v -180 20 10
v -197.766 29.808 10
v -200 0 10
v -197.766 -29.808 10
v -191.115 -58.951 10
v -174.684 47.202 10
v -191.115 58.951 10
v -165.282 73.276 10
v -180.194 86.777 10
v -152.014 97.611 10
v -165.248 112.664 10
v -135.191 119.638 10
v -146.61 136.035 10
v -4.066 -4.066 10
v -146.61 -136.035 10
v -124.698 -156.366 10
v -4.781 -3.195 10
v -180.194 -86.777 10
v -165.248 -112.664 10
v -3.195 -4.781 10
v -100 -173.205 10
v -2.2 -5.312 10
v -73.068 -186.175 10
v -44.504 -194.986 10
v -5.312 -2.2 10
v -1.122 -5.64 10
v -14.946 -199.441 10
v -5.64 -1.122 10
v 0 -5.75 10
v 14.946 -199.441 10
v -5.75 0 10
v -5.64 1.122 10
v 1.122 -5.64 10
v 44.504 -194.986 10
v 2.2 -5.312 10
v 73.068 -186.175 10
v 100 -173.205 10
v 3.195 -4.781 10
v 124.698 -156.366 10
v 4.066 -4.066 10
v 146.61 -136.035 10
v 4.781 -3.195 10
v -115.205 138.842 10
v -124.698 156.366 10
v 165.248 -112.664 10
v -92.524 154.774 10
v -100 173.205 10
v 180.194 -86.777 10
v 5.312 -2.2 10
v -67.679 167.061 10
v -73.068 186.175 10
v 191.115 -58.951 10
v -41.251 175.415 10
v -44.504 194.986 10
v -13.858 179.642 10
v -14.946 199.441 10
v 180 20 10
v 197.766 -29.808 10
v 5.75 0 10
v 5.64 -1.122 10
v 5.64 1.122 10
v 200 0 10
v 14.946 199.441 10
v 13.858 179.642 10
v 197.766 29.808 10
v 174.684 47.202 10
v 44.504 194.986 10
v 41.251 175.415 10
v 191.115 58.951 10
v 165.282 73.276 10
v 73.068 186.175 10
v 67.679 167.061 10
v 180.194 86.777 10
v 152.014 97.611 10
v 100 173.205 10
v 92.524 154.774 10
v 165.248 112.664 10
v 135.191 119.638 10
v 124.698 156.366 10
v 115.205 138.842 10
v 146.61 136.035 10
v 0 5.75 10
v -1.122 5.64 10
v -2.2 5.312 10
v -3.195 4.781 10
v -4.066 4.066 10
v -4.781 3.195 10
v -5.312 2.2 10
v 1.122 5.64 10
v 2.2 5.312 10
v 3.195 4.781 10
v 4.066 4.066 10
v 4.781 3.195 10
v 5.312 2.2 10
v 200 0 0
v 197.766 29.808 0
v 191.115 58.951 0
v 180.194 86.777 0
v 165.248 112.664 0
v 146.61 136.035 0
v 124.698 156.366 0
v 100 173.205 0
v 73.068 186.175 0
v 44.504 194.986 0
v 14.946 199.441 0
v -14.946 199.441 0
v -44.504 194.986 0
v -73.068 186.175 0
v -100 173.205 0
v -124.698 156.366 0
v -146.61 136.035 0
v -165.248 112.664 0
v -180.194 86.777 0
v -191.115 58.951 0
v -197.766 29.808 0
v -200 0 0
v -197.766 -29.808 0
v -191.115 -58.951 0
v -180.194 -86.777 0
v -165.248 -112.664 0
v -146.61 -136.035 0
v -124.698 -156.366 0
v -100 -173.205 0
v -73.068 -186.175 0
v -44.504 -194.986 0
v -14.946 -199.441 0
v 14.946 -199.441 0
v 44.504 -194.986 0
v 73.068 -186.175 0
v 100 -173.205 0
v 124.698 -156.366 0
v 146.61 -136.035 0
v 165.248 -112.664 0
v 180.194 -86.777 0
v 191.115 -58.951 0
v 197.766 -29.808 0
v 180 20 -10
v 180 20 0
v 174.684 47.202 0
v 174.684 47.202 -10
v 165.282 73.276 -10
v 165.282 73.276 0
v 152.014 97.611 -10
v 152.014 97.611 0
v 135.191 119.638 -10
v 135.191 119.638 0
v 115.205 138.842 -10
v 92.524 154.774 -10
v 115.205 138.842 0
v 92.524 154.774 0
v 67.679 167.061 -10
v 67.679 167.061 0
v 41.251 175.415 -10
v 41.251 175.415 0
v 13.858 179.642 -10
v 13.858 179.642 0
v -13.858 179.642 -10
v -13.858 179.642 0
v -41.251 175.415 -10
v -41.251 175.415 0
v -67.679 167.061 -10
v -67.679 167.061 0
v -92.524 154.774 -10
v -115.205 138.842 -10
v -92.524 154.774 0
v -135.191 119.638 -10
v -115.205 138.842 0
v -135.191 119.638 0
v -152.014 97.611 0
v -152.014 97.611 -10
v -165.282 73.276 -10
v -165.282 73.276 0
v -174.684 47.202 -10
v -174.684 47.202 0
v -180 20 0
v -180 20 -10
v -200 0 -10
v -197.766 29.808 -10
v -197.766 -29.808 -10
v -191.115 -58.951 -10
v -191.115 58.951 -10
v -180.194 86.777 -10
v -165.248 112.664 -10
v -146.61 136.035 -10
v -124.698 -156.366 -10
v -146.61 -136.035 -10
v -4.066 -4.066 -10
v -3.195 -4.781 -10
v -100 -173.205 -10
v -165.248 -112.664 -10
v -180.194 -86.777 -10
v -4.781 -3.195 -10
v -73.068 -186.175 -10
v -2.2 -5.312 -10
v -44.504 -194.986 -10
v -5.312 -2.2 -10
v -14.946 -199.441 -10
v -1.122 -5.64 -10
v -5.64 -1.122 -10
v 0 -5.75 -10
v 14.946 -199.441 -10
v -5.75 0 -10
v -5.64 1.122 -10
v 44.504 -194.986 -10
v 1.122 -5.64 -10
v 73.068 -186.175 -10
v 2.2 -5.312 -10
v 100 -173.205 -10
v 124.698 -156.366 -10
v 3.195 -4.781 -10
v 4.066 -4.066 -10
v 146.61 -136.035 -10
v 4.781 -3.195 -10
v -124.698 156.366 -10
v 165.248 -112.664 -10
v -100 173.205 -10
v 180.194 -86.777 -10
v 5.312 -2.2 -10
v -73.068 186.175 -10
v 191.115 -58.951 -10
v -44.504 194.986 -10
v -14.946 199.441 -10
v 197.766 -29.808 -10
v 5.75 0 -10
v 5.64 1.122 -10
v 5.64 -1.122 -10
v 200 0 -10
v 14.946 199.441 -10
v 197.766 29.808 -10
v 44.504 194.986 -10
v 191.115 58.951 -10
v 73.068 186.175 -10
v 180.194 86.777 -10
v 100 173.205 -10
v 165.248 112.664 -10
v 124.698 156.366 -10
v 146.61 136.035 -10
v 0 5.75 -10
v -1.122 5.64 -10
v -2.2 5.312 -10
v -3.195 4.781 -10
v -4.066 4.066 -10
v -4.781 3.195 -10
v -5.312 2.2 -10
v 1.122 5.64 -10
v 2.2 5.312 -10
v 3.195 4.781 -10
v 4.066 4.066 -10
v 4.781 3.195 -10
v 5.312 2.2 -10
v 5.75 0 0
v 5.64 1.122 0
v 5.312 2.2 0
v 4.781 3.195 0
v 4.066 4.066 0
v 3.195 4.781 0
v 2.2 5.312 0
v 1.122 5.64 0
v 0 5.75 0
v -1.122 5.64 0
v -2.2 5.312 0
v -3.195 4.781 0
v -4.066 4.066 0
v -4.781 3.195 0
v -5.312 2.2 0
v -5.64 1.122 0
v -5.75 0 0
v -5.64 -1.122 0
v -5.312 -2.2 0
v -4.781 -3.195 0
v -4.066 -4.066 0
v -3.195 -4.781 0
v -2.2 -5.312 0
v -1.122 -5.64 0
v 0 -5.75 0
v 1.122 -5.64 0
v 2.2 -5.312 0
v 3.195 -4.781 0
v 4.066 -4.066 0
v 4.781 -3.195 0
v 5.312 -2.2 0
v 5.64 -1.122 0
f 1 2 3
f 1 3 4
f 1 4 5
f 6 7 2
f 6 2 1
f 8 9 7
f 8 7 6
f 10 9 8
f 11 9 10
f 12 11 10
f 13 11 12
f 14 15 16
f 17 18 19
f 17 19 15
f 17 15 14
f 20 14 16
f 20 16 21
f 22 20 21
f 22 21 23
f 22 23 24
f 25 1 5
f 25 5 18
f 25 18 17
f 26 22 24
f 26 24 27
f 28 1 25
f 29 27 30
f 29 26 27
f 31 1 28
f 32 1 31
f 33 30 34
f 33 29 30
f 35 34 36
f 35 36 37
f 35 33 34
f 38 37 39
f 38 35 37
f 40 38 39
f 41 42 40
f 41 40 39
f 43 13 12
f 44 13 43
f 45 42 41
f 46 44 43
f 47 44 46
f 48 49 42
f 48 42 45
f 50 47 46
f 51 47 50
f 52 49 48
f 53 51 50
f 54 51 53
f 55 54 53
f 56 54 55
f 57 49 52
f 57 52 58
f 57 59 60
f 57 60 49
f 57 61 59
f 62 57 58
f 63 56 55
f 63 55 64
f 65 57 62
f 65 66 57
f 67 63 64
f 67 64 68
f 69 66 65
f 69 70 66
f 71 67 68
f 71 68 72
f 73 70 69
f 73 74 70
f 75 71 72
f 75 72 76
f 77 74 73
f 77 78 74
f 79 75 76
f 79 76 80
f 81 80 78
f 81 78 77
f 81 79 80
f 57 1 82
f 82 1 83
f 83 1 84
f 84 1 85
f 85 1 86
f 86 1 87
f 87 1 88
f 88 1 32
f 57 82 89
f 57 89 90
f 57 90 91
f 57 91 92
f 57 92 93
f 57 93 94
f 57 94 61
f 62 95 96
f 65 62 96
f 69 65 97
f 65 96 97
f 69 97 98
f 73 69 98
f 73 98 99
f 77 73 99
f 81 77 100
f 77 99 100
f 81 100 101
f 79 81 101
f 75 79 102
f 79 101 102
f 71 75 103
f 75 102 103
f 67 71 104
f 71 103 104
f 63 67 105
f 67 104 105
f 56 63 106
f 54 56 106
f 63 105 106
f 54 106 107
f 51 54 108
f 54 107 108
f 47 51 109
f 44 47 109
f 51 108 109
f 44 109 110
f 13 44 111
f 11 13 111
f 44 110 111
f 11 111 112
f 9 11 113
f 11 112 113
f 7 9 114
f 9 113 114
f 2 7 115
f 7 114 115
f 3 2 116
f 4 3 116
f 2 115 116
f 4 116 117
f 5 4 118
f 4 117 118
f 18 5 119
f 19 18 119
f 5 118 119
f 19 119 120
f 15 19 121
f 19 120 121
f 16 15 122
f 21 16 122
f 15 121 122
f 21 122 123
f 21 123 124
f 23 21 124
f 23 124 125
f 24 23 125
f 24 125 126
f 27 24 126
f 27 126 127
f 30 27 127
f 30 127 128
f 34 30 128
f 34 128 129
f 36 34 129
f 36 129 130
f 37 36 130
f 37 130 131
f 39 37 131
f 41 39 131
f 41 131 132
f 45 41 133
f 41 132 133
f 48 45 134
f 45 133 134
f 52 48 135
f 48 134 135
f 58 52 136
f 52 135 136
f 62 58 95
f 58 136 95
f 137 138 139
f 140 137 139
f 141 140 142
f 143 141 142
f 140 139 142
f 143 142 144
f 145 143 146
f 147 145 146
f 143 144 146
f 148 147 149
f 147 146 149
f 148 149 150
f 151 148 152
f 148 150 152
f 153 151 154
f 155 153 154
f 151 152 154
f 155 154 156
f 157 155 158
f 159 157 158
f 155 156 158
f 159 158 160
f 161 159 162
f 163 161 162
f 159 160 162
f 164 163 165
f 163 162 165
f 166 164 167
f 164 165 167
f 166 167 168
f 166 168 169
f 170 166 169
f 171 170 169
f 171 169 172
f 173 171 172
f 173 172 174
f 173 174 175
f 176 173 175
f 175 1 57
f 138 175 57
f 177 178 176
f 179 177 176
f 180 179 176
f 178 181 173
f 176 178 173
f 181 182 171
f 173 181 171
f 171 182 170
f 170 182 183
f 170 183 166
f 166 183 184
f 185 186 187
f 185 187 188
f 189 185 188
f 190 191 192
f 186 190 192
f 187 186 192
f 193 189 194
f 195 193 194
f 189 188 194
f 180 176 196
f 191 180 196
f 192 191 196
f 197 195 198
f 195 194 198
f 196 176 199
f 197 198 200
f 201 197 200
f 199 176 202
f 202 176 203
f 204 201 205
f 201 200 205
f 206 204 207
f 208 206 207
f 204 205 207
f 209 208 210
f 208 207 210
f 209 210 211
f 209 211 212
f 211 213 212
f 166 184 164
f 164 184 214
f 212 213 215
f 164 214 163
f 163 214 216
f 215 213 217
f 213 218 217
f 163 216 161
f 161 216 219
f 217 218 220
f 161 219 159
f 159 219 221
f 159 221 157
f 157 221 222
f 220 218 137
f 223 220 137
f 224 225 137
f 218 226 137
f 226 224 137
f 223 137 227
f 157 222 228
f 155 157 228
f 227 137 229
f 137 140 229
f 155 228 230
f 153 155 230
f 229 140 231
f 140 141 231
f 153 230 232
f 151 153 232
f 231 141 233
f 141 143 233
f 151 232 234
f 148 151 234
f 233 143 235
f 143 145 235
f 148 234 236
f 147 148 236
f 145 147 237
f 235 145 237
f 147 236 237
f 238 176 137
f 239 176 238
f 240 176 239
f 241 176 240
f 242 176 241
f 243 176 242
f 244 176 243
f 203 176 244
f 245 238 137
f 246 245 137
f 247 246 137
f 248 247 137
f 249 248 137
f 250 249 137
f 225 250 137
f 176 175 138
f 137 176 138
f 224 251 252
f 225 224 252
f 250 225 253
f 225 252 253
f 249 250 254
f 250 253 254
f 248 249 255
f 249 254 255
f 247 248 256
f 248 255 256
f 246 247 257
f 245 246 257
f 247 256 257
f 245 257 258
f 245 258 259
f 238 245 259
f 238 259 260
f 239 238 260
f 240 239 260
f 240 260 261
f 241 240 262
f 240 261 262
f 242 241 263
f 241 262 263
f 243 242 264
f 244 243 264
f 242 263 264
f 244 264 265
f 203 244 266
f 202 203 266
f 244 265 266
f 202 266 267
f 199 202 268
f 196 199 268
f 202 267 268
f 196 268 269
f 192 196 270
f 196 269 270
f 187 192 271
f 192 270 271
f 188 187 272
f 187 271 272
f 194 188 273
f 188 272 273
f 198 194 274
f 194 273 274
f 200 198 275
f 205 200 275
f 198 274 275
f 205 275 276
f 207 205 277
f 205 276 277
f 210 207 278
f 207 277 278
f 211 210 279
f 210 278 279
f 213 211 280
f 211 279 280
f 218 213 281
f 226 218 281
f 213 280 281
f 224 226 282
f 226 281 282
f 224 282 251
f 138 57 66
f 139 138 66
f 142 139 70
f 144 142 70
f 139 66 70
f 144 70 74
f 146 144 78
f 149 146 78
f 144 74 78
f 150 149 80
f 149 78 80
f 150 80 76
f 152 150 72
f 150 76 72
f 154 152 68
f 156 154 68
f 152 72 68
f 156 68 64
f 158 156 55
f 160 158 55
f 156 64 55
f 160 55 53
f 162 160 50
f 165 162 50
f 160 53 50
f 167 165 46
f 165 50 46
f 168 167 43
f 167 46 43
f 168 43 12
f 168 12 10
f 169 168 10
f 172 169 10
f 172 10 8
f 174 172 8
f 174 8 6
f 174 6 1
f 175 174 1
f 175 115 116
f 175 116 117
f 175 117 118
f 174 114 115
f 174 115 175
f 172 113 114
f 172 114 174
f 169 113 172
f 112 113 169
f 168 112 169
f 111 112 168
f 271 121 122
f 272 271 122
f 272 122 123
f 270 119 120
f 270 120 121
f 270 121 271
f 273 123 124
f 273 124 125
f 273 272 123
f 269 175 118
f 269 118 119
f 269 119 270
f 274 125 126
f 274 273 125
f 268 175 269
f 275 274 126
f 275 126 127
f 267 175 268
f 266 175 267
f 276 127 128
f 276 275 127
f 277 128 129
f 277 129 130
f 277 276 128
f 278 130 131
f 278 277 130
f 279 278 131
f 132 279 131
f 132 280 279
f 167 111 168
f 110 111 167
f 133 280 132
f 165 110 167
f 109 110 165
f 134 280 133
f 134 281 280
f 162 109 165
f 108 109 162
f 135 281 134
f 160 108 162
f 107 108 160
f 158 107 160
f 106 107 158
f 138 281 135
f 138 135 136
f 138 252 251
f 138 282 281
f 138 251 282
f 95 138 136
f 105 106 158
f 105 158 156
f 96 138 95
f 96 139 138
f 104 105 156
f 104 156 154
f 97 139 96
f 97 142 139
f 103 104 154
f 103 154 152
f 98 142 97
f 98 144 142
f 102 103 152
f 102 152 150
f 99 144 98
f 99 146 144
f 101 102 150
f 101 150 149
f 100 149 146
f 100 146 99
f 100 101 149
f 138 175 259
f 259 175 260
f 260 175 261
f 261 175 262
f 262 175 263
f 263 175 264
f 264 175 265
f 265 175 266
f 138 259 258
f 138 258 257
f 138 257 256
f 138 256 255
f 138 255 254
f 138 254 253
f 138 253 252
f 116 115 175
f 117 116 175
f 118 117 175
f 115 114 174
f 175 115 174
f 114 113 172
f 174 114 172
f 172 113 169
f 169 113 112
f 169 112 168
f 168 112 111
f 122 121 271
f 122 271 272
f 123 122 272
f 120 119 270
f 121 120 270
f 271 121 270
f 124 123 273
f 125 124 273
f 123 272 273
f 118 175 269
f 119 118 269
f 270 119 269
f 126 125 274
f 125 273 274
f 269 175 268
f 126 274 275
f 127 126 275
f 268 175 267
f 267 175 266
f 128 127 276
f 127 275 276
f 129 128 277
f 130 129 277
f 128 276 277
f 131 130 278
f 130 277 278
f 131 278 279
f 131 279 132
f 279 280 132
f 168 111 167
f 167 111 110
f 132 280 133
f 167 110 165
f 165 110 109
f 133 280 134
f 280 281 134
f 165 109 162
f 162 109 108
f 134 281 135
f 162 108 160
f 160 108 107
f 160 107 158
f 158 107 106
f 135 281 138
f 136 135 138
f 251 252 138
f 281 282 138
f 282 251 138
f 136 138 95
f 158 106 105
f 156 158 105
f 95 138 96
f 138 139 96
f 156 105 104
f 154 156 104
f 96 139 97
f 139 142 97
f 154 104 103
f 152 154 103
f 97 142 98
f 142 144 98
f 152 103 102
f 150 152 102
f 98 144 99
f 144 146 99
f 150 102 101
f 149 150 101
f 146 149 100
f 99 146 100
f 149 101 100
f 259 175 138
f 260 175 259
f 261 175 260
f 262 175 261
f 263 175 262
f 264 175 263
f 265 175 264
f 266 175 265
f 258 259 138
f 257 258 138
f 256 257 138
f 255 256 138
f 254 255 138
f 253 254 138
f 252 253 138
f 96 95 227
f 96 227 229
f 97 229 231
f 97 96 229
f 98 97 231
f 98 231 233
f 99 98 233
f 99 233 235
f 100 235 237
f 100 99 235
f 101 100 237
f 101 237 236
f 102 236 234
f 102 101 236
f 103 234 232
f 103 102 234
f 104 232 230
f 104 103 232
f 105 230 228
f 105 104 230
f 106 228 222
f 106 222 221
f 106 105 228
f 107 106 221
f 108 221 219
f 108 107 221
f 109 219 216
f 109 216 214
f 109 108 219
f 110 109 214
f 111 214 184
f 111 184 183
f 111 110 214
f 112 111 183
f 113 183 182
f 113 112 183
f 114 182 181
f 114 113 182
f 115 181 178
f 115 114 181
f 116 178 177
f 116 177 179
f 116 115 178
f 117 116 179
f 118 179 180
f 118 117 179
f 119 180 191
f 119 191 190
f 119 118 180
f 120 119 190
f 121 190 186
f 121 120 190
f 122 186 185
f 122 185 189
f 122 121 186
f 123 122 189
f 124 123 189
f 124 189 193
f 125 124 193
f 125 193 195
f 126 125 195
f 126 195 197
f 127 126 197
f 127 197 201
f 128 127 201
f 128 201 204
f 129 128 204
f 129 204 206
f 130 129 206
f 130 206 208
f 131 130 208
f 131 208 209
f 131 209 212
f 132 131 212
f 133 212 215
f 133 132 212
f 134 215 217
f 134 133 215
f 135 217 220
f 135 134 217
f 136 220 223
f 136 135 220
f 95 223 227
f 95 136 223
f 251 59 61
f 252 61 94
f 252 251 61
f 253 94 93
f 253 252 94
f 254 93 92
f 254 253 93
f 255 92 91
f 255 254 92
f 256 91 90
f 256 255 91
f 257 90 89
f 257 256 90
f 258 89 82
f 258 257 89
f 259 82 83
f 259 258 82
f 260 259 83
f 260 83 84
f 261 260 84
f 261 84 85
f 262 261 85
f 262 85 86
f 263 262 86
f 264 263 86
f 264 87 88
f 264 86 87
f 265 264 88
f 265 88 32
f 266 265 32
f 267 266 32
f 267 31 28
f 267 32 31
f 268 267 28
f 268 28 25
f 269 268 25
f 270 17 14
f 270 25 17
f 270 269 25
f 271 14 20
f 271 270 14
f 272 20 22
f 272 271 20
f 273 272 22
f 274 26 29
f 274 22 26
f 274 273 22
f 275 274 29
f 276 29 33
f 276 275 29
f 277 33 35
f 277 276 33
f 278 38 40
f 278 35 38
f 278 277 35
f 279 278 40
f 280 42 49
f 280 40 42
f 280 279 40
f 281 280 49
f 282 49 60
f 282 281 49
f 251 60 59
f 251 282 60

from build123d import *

# Parameters (mm, degrees)
F0_R          = 200
F1_DEPTH      = 10
F2_DEPTH      = 10
F3_R          = 5.75
F4_DEPTH      = 10
F4_DEPTH_BACK = 20
F6_DEPTH      = 10
F6_DEPTH_BACK = 10


with BuildPart() as f1:
    # F0 (on Top) → F1 (new body)
    with BuildSketch(Plane.XY):
        Circle(F0_R)
    extrude(amount=F1_DEPTH)


with BuildPart() as f2:
    # F0 (on Top) → F2 (new body)
    with BuildSketch(Plane.XY):
        Circle(F0_R)
    extrude(amount=-F2_DEPTH)


with BuildPart() as f4_tool:
    # F3 (on Top) → F4 (new body, two sides)
    with BuildSketch(Plane.XY) as f4_sk:
        Circle(F3_R)
    extrude(amount=-F4_DEPTH)
    extrude(f4_sk.sketch, amount=F4_DEPTH_BACK)


with BuildPart() as f1_1:
    add(f1.part)

    # F4: cut by f4_tool
    add(f4_tool.part, mode=Mode.SUBTRACT)


with BuildPart() as f2_1:
    add(f2.part)

    # F4: cut by f4_tool
    add(f4_tool.part, mode=Mode.SUBTRACT)


with BuildPart() as f6_tool:
    # F5 (on Top) → F6 (new body, two sides)
    with BuildSketch(Plane.XY) as f6_sk:
        with BuildLine():
            Line((-180, 20), (180, 20))
            ThreePointArc((180, 20), (0, 180.1724752314), (-180, 20))
        make_face()
    extrude(amount=F6_DEPTH)
    extrude(f6_sk.sketch, amount=-F6_DEPTH_BACK)


with BuildPart() as f1_2:
    add(f1_1.part)

    # F6: cut by f6_tool
    add(f6_tool.part, mode=Mode.SUBTRACT)


with BuildPart() as f2_2:
    add(f2_1.part)

    # F6: cut by f6_tool
    add(f6_tool.part, mode=Mode.SUBTRACT)


solid = Compound([f1_2.part, f2_2.part])
